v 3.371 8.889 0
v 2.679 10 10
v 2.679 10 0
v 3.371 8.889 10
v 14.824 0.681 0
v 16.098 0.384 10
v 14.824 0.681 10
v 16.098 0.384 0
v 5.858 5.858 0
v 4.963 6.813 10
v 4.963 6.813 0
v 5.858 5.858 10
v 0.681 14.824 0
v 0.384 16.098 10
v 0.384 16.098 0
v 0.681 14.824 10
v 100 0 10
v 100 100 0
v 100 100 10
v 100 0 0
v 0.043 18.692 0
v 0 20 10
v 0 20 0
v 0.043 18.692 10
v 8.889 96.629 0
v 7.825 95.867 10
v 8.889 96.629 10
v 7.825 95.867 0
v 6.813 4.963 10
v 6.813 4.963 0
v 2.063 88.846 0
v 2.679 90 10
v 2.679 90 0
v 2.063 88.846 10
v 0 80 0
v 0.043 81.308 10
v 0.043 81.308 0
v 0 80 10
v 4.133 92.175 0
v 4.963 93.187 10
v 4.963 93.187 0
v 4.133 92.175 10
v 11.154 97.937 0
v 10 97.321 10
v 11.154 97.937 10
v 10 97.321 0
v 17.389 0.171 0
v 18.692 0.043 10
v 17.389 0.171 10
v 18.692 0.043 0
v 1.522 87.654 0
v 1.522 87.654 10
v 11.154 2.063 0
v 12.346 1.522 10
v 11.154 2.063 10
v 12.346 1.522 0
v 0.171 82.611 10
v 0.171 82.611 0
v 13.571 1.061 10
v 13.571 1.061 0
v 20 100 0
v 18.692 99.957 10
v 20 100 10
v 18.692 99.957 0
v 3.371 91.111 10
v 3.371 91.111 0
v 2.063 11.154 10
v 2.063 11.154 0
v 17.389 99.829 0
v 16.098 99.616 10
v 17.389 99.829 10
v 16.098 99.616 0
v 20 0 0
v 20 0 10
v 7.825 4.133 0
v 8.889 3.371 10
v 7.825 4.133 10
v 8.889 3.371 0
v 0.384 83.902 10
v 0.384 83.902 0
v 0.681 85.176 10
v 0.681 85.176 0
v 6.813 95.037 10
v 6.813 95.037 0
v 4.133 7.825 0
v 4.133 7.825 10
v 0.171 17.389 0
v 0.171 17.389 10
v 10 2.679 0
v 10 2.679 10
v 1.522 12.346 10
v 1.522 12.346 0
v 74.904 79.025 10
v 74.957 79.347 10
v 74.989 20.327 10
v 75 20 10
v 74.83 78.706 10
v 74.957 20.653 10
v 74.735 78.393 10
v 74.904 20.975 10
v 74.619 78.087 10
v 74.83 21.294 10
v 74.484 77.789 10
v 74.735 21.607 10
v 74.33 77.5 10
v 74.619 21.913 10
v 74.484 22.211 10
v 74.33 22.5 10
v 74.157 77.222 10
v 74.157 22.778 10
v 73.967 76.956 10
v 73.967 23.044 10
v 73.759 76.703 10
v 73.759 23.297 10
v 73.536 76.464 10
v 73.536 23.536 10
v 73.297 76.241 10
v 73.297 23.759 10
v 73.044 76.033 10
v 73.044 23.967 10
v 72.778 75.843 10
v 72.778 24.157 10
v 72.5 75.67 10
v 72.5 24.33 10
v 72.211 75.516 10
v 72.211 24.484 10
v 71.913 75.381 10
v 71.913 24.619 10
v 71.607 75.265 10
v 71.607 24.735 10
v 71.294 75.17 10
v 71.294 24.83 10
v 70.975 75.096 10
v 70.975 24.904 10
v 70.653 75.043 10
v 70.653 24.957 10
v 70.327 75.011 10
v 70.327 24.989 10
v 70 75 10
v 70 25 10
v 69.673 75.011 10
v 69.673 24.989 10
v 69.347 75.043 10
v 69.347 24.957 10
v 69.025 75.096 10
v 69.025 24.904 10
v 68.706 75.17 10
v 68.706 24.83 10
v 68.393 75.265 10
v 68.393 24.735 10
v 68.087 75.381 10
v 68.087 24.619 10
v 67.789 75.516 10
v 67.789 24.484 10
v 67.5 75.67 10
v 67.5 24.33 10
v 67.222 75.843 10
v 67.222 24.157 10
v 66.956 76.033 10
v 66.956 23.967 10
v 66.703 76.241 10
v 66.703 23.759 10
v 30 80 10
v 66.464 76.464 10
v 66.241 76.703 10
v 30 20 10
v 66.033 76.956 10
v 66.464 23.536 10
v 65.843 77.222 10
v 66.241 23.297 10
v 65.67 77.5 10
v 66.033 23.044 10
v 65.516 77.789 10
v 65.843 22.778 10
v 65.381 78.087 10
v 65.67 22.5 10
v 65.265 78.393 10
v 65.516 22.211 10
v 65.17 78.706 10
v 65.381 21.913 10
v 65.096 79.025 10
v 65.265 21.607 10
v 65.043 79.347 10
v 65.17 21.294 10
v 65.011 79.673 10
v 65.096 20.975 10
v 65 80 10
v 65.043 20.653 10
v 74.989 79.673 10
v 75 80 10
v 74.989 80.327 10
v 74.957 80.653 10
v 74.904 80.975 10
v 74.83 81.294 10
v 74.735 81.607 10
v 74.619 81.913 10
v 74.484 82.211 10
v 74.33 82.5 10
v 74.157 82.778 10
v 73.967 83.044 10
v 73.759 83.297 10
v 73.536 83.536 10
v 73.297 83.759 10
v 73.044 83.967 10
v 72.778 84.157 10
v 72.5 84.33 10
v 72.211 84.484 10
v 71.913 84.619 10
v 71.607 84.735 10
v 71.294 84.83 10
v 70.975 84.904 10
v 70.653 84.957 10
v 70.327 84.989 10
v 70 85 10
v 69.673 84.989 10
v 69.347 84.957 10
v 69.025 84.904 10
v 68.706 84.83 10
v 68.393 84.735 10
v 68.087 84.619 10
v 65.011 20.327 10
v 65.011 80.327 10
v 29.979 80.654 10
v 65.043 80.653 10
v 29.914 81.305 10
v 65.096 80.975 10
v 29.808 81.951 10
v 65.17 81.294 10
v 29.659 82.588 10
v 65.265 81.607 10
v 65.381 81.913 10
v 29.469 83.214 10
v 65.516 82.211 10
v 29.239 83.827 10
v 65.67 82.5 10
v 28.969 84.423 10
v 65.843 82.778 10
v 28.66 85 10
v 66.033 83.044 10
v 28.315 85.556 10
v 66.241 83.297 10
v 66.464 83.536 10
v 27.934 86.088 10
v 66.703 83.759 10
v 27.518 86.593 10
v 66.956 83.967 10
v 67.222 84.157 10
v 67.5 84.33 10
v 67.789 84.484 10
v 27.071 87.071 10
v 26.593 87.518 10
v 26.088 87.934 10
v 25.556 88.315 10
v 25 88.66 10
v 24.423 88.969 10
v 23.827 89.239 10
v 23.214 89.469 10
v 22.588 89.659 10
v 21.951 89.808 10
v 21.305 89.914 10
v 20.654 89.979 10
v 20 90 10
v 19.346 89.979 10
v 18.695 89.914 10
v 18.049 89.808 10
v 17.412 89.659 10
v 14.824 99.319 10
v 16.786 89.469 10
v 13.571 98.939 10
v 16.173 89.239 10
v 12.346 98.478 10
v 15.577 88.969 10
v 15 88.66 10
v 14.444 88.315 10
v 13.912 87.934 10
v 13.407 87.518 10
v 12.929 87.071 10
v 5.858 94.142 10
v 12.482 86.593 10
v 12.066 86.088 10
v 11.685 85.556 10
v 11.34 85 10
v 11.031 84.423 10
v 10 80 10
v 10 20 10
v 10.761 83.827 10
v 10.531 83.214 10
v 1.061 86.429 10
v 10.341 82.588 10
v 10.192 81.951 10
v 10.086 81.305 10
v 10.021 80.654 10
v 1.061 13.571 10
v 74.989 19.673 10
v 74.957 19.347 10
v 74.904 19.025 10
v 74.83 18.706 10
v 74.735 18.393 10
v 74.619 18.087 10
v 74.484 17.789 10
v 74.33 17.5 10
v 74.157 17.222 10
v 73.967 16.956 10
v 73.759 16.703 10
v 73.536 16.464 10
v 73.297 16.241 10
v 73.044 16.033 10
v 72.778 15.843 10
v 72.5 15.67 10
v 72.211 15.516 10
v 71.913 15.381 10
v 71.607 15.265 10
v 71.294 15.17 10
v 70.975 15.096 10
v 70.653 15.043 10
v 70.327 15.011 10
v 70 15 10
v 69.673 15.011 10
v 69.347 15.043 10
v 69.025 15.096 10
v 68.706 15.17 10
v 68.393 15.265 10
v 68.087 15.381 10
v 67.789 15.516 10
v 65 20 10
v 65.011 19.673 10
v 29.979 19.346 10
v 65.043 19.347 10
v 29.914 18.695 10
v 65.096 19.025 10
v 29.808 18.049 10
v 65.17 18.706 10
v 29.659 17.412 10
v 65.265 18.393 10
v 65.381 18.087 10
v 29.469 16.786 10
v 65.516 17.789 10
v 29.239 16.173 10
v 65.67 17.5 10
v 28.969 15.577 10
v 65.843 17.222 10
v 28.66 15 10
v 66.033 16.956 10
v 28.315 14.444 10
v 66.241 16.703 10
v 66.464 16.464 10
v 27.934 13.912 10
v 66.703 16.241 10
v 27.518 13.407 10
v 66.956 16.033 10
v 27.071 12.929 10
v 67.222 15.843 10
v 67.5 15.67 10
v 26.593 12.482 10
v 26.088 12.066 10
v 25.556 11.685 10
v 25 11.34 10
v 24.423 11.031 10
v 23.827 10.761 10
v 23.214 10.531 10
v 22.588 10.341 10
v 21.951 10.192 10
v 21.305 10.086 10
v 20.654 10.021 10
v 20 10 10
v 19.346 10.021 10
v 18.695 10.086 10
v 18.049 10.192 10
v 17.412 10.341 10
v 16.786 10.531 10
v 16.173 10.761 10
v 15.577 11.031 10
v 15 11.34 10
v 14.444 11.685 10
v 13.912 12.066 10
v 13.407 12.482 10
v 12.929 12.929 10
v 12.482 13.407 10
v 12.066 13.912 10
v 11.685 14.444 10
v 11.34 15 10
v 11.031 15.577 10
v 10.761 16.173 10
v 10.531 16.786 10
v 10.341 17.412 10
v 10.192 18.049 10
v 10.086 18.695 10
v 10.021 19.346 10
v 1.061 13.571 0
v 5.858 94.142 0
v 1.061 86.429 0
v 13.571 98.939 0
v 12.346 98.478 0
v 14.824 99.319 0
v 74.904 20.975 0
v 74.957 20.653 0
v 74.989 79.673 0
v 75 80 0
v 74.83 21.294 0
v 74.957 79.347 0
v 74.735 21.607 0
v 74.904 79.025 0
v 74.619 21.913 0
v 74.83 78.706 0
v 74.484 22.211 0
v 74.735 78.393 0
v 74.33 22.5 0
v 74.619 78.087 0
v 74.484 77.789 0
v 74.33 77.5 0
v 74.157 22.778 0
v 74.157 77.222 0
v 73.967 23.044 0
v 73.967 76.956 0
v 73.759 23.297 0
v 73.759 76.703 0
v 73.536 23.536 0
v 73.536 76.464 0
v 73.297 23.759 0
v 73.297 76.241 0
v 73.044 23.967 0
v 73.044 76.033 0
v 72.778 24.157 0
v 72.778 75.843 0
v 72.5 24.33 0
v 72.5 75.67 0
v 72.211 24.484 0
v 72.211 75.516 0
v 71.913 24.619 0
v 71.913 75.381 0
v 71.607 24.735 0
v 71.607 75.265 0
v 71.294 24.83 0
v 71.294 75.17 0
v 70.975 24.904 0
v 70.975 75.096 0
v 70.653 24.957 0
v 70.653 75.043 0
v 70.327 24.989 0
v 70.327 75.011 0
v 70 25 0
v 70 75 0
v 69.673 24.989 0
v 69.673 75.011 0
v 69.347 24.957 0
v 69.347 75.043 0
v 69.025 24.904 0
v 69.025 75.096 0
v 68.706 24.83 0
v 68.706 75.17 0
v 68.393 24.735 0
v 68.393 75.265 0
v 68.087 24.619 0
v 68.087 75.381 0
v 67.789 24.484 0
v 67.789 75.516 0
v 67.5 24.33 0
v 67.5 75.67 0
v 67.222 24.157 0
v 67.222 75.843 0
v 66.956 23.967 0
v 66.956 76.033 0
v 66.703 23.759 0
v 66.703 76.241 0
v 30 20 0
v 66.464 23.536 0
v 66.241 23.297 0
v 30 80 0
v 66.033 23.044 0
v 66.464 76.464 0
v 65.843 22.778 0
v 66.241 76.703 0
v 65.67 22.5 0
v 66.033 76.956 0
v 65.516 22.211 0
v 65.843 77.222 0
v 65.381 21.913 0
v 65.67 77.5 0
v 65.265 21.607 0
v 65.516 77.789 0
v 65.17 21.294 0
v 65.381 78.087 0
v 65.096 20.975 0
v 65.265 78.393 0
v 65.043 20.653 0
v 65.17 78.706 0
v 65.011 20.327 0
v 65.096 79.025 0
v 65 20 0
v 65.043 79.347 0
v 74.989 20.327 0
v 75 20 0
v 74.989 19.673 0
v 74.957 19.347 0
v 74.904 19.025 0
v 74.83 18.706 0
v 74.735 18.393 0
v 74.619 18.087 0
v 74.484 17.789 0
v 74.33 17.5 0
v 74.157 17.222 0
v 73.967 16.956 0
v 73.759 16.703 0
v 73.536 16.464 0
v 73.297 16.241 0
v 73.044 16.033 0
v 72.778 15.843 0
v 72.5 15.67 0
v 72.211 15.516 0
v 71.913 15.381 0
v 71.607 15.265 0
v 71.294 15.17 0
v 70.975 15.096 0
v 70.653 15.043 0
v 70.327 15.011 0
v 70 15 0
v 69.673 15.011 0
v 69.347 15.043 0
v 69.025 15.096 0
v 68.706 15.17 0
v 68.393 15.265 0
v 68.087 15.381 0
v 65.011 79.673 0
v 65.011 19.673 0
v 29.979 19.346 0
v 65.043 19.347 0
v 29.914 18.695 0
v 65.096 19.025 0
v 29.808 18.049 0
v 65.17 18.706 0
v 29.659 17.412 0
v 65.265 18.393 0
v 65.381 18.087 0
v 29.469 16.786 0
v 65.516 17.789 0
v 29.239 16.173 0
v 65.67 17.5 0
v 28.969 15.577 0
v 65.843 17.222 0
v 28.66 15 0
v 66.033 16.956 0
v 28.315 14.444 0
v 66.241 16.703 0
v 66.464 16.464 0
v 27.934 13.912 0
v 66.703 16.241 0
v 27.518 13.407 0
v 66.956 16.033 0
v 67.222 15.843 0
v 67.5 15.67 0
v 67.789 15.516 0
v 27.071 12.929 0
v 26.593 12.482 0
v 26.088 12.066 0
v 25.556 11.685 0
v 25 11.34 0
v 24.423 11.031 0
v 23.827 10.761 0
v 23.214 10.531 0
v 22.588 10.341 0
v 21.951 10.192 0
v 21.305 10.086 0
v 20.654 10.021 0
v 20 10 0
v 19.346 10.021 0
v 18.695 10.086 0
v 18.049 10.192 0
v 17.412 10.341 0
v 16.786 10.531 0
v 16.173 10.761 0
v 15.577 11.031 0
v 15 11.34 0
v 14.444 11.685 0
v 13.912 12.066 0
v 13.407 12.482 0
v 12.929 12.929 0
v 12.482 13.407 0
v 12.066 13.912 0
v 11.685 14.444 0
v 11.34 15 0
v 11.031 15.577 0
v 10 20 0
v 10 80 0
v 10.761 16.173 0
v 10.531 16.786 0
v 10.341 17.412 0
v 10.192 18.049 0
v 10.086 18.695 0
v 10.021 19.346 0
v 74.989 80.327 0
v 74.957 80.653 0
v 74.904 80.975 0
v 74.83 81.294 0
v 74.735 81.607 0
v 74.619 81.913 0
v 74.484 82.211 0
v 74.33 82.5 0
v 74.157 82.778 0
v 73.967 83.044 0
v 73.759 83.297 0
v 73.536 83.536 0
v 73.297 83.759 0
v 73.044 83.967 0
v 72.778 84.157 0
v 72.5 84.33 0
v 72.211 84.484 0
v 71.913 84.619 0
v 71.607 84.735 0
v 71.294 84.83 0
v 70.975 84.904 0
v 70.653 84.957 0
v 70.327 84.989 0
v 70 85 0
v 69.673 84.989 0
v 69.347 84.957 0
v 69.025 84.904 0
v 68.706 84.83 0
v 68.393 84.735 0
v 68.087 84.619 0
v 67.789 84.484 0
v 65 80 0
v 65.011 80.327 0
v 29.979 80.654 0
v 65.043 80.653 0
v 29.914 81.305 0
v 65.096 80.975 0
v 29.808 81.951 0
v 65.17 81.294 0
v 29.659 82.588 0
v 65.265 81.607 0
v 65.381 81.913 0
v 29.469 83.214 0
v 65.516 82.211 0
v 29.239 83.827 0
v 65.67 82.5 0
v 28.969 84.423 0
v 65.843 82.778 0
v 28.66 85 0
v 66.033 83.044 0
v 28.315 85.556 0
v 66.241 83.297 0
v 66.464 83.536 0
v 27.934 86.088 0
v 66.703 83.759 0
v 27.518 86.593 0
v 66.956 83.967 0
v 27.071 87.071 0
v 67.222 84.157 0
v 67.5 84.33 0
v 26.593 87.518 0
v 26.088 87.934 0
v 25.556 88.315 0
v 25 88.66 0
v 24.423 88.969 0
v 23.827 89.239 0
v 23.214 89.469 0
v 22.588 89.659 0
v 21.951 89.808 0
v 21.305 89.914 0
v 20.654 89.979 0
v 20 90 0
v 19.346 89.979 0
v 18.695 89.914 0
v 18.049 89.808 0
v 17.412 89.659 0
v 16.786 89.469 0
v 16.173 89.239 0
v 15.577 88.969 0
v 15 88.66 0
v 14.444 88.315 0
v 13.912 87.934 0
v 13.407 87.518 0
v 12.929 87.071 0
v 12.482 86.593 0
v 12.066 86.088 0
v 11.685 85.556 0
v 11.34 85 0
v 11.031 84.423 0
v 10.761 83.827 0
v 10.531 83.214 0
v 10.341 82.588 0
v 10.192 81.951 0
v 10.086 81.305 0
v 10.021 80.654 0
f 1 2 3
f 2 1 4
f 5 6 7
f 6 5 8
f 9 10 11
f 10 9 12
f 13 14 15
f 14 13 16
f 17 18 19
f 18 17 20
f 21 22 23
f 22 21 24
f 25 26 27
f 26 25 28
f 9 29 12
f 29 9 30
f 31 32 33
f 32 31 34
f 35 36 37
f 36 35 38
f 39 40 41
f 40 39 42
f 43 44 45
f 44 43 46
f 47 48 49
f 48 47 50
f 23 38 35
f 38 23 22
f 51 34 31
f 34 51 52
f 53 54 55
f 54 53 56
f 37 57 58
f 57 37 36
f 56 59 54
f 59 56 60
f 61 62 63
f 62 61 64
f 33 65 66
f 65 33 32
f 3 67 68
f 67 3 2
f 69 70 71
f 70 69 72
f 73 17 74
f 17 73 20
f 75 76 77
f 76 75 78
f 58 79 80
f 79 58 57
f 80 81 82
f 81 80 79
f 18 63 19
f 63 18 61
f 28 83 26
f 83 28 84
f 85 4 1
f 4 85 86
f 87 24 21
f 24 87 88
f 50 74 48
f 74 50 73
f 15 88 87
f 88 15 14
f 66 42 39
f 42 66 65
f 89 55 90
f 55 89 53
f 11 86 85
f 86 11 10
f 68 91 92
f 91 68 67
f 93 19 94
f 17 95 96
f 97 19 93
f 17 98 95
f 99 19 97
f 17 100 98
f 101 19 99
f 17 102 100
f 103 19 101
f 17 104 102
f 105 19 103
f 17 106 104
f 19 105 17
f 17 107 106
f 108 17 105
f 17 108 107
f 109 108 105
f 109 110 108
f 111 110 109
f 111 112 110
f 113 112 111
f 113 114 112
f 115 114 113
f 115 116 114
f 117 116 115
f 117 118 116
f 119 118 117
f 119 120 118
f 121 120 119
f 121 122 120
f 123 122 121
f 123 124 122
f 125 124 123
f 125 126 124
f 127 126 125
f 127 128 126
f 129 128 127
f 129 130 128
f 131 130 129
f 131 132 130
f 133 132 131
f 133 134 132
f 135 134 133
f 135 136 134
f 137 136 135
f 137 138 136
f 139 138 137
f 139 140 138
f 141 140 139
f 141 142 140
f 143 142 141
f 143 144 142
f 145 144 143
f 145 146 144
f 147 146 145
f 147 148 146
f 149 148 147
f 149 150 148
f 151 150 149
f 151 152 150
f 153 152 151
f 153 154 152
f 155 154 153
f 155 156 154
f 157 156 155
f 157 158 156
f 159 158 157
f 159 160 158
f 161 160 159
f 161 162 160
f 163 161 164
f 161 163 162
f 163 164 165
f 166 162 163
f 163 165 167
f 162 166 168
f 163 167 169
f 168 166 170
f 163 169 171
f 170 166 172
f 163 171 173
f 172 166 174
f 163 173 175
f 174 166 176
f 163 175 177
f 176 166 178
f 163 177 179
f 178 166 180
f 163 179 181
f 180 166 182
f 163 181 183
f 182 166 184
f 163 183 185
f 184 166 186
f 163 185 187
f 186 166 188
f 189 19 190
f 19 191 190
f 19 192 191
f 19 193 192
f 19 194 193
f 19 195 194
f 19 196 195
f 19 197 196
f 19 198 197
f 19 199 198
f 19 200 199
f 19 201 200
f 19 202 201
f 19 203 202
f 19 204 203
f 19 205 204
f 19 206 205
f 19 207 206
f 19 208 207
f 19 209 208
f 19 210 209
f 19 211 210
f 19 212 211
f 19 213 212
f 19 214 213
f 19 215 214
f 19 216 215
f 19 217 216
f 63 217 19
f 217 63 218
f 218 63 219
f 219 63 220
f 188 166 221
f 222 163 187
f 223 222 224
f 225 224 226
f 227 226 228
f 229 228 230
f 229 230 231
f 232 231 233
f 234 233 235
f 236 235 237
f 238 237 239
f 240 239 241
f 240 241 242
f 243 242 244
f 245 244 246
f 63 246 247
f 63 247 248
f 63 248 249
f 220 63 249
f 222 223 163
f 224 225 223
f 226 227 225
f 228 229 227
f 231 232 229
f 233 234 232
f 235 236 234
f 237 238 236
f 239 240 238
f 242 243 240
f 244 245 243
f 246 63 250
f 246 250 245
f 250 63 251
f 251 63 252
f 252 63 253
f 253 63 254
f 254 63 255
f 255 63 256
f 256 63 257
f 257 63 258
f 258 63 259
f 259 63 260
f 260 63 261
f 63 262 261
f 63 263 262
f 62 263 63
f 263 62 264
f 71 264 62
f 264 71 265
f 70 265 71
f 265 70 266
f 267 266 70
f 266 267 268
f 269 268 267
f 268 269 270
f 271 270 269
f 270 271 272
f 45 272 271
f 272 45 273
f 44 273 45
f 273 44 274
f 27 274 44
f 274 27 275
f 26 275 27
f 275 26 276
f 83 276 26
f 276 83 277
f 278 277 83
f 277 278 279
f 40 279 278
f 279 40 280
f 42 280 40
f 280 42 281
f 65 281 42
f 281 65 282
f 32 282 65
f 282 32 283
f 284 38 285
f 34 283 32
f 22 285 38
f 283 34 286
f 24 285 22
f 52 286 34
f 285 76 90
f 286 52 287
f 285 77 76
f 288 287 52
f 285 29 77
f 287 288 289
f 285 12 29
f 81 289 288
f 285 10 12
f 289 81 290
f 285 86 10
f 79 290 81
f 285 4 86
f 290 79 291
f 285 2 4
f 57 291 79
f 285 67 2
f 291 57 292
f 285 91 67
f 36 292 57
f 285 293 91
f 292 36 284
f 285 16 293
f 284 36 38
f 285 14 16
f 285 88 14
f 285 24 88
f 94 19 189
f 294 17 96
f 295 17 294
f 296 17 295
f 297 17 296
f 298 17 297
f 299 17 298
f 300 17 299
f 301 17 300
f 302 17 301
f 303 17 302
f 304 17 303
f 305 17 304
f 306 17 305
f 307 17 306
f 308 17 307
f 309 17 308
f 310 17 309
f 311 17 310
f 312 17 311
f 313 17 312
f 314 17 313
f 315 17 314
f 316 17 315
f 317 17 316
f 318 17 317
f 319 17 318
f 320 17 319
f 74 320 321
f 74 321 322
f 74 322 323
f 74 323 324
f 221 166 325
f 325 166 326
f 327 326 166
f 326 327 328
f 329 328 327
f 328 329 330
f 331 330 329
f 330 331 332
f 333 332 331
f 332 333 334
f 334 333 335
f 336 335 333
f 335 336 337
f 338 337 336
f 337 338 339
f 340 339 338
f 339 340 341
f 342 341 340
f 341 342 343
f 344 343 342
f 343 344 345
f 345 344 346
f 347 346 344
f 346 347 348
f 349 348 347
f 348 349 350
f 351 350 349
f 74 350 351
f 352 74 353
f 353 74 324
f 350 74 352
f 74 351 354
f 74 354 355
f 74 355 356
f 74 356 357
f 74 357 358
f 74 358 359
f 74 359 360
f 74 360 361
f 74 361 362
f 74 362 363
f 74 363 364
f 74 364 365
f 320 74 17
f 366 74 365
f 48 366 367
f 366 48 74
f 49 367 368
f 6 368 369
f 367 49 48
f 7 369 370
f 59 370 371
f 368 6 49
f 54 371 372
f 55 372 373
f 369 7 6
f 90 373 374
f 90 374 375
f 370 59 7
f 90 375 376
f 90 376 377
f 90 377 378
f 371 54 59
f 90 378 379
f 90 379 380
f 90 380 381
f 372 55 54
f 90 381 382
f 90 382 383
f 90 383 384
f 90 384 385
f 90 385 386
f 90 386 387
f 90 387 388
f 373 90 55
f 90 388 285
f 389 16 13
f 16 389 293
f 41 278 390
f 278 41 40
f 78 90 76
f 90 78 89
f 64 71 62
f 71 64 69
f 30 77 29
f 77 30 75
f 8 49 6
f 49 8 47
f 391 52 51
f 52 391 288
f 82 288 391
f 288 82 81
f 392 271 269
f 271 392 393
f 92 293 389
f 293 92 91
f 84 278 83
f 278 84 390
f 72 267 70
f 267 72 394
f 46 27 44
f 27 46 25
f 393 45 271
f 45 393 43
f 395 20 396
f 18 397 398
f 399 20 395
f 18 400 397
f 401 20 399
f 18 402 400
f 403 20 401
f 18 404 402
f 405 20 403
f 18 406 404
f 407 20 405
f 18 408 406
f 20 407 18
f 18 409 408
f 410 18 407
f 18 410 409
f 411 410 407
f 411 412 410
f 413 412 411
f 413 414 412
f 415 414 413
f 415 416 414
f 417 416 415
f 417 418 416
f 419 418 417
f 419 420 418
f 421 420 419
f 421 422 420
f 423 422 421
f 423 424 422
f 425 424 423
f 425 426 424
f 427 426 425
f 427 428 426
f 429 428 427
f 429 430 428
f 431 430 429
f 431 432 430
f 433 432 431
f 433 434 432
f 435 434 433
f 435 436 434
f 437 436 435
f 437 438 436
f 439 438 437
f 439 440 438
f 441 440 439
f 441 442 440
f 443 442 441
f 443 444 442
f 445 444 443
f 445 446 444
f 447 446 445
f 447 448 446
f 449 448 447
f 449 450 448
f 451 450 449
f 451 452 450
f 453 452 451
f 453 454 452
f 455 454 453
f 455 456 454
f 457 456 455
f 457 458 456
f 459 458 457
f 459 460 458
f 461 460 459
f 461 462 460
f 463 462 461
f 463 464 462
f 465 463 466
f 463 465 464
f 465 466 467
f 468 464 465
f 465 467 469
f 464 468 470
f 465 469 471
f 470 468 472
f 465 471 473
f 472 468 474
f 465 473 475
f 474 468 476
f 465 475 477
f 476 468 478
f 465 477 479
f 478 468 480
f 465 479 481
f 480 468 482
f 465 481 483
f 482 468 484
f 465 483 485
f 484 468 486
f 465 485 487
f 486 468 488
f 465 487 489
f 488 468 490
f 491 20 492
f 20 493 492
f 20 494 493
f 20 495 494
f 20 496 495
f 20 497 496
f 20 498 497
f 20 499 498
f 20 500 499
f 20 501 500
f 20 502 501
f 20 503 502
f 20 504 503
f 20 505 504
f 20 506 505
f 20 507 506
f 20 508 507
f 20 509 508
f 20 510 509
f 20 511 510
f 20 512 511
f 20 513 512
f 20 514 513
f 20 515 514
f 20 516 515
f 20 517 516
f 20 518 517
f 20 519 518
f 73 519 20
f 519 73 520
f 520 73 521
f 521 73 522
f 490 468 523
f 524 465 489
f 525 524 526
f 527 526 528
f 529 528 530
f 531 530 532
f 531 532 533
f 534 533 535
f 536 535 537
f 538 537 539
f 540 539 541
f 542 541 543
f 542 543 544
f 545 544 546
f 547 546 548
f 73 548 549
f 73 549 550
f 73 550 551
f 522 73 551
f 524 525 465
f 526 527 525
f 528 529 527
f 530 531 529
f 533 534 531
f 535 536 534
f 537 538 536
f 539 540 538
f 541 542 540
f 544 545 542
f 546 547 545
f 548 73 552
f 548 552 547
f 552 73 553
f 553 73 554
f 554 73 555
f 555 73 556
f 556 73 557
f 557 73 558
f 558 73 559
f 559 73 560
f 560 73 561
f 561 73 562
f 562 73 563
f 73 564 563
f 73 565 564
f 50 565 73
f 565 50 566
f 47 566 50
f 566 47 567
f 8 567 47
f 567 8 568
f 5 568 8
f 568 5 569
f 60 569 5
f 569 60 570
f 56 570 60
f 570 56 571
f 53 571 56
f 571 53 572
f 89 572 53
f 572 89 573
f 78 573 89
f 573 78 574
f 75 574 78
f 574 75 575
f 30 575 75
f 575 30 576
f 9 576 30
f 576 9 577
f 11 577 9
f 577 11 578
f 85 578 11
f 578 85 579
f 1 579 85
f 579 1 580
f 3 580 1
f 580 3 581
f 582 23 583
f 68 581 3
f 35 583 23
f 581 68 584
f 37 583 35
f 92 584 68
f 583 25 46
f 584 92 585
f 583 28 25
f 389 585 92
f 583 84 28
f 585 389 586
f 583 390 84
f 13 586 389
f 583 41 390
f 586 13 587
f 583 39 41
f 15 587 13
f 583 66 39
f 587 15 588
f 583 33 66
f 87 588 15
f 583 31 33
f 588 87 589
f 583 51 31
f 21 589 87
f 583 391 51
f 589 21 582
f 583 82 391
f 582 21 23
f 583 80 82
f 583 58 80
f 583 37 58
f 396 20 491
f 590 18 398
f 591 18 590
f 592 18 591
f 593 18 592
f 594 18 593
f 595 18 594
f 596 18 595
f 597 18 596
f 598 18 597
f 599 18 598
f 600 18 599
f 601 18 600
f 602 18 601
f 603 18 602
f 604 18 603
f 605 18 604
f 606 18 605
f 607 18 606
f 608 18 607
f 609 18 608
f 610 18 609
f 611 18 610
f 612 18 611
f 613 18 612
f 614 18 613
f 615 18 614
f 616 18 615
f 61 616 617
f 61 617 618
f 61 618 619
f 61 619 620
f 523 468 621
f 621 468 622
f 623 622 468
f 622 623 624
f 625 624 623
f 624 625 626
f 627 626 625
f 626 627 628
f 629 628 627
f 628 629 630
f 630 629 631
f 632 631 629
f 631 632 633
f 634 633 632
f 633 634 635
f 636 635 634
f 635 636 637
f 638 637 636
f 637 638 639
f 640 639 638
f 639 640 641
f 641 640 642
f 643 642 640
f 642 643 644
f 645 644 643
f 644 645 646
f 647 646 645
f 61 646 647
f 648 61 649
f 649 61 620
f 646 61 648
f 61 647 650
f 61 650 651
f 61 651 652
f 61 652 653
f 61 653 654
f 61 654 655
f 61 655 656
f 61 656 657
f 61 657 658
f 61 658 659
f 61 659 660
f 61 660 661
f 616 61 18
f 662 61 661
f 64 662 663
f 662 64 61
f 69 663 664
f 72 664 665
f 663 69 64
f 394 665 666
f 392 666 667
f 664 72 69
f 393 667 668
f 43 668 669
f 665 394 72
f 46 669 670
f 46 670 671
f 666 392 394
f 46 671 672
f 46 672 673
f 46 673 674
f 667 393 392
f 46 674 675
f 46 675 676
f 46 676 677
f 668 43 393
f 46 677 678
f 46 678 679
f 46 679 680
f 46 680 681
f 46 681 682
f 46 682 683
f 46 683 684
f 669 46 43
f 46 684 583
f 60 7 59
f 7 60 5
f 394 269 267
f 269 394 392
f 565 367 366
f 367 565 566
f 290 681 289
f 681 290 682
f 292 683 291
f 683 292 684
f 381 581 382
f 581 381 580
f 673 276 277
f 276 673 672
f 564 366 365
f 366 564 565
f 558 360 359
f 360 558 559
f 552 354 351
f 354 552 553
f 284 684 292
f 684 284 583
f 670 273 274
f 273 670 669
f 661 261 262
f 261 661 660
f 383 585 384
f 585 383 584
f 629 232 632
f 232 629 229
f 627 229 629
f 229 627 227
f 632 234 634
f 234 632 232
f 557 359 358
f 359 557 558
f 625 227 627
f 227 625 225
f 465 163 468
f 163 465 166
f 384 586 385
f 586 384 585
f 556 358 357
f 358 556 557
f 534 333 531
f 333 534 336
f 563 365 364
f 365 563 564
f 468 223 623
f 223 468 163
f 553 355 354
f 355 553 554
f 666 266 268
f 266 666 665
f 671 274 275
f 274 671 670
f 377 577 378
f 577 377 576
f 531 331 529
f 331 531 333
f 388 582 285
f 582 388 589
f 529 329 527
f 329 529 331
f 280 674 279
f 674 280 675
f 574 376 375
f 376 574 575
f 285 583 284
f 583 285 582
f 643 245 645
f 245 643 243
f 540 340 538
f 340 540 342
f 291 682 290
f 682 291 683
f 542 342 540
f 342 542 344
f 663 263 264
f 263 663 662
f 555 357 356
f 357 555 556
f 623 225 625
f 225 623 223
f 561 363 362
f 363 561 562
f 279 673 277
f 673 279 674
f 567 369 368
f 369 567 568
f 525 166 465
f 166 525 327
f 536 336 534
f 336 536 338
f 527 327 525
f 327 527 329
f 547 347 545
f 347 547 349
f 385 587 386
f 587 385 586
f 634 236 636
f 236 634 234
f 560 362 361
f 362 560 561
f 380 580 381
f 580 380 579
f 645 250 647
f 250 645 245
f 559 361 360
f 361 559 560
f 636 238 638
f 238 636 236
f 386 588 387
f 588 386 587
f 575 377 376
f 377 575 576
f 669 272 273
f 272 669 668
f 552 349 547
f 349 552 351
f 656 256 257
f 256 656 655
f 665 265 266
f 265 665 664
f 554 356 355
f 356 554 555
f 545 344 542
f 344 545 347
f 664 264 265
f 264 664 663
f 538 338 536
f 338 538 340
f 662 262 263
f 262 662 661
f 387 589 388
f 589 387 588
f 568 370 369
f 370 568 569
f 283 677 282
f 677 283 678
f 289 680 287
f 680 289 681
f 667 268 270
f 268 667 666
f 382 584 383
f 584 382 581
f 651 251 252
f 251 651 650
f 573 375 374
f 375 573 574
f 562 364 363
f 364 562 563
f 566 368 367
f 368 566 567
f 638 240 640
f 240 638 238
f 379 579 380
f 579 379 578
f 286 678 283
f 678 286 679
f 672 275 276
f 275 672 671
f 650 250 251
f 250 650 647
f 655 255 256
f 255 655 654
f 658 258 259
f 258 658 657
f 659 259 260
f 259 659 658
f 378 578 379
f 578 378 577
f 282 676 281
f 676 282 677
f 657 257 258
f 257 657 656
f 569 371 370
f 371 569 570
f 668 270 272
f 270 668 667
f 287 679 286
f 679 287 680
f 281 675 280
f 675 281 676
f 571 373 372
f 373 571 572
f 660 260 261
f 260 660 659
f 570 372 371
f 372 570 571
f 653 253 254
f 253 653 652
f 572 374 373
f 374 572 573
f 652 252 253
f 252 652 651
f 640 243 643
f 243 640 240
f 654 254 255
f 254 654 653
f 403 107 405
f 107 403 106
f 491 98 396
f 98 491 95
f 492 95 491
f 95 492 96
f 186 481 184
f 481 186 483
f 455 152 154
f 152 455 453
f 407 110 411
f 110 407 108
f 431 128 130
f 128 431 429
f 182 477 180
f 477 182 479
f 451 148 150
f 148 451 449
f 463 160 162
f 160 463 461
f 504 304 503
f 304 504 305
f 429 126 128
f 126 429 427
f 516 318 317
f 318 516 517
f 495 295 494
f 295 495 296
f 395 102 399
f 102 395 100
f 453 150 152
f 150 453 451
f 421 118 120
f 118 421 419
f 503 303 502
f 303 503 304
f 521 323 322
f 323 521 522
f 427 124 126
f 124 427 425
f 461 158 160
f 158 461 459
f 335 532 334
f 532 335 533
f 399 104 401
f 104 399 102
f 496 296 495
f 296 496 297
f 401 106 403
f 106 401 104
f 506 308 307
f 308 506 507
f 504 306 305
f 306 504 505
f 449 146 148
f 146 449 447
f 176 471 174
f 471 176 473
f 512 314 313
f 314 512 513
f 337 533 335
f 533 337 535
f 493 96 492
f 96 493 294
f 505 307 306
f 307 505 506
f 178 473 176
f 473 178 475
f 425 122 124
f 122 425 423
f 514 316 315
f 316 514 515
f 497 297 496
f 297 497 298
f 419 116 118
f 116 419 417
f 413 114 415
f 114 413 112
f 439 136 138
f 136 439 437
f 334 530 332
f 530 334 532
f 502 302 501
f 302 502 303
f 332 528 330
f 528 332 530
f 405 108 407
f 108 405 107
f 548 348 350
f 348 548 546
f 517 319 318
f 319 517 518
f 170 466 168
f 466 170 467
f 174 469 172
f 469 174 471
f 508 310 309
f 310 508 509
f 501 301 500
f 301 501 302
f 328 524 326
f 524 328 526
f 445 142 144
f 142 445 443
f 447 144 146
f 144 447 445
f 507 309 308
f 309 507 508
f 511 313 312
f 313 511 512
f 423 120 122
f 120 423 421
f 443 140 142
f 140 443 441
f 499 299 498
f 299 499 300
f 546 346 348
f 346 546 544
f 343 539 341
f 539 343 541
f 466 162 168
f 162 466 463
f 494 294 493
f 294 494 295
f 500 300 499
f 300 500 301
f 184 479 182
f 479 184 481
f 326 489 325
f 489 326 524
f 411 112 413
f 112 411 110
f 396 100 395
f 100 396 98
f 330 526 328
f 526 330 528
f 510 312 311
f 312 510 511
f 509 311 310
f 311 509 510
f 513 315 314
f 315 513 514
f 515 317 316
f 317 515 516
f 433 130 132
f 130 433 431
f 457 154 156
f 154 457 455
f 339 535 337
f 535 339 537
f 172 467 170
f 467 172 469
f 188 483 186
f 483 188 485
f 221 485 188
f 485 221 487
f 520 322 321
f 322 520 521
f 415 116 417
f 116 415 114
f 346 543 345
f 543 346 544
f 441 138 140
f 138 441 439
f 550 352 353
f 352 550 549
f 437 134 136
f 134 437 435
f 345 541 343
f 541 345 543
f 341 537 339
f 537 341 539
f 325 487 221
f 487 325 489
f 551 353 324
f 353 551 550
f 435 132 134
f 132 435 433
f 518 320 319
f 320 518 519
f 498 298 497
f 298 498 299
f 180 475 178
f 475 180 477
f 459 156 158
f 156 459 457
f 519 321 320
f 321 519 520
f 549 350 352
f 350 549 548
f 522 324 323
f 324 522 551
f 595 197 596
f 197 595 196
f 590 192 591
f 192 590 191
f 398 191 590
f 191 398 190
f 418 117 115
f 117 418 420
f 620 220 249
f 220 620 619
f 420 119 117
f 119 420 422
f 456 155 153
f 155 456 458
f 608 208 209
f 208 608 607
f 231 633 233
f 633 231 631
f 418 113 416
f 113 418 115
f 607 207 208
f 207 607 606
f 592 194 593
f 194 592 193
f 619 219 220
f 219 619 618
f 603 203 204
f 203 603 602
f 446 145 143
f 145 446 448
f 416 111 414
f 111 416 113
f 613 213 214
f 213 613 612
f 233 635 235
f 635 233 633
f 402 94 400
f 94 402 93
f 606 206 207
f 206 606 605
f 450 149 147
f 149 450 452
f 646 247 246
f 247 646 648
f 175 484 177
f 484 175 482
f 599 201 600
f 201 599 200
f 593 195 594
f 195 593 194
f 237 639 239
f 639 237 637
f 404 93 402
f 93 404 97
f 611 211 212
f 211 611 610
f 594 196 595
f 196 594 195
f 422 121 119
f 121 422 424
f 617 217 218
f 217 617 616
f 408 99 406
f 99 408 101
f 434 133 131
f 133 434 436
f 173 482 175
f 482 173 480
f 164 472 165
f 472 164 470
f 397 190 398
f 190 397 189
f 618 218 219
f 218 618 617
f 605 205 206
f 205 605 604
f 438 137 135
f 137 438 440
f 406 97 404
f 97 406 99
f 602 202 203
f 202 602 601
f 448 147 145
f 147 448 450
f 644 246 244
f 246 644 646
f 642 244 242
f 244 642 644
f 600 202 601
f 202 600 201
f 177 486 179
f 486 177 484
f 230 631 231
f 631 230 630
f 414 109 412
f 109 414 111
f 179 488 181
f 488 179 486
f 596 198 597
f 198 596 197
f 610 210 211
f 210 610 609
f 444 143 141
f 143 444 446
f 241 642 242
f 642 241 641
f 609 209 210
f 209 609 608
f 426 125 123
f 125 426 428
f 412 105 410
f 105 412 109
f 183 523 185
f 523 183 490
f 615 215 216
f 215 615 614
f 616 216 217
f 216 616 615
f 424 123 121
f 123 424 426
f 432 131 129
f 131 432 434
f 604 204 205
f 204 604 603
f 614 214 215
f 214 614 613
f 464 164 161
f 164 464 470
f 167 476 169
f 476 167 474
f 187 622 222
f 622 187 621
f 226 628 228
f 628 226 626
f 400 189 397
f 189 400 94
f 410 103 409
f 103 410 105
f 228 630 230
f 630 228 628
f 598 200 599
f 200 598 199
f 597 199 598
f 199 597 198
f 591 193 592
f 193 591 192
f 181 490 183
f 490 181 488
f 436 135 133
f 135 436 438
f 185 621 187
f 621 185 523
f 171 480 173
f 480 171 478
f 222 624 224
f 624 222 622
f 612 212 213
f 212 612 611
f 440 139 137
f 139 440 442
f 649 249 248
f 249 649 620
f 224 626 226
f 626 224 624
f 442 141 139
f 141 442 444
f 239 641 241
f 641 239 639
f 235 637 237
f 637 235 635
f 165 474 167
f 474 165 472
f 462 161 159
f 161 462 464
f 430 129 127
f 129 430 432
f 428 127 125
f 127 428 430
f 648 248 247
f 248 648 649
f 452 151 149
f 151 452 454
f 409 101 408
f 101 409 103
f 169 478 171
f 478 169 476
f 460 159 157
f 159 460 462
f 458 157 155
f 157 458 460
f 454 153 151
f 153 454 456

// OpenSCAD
// test with hull
// 16.05.2026 Sebastian Weigl
$fn = 96;
difference() {
// main body
  hull() {
    translate([20,20,0])
    cylinder(h=10,r=20,center=false);
    translate([60,0,0])
    cube([40,40,10]);
    translate([20,80,0])
    cylinder(h=10,r=20,center=false);
    translate([60,60,0])
    cube([40,40,10]);
  }
// rounded slit
  hull() {
    translate([20,20,0])
    cylinder(h=10,r=10,center=false);
    translate([20,80,0])
    cylinder(h=10,r=10,center=false);
  }
// hole 1
  translate([70,20,5])
  cylinder(h=10,r=5,center=true);
// hole 2 
  translate([70,80,5])
  cylinder(h=10,r=5,center=true);
}
